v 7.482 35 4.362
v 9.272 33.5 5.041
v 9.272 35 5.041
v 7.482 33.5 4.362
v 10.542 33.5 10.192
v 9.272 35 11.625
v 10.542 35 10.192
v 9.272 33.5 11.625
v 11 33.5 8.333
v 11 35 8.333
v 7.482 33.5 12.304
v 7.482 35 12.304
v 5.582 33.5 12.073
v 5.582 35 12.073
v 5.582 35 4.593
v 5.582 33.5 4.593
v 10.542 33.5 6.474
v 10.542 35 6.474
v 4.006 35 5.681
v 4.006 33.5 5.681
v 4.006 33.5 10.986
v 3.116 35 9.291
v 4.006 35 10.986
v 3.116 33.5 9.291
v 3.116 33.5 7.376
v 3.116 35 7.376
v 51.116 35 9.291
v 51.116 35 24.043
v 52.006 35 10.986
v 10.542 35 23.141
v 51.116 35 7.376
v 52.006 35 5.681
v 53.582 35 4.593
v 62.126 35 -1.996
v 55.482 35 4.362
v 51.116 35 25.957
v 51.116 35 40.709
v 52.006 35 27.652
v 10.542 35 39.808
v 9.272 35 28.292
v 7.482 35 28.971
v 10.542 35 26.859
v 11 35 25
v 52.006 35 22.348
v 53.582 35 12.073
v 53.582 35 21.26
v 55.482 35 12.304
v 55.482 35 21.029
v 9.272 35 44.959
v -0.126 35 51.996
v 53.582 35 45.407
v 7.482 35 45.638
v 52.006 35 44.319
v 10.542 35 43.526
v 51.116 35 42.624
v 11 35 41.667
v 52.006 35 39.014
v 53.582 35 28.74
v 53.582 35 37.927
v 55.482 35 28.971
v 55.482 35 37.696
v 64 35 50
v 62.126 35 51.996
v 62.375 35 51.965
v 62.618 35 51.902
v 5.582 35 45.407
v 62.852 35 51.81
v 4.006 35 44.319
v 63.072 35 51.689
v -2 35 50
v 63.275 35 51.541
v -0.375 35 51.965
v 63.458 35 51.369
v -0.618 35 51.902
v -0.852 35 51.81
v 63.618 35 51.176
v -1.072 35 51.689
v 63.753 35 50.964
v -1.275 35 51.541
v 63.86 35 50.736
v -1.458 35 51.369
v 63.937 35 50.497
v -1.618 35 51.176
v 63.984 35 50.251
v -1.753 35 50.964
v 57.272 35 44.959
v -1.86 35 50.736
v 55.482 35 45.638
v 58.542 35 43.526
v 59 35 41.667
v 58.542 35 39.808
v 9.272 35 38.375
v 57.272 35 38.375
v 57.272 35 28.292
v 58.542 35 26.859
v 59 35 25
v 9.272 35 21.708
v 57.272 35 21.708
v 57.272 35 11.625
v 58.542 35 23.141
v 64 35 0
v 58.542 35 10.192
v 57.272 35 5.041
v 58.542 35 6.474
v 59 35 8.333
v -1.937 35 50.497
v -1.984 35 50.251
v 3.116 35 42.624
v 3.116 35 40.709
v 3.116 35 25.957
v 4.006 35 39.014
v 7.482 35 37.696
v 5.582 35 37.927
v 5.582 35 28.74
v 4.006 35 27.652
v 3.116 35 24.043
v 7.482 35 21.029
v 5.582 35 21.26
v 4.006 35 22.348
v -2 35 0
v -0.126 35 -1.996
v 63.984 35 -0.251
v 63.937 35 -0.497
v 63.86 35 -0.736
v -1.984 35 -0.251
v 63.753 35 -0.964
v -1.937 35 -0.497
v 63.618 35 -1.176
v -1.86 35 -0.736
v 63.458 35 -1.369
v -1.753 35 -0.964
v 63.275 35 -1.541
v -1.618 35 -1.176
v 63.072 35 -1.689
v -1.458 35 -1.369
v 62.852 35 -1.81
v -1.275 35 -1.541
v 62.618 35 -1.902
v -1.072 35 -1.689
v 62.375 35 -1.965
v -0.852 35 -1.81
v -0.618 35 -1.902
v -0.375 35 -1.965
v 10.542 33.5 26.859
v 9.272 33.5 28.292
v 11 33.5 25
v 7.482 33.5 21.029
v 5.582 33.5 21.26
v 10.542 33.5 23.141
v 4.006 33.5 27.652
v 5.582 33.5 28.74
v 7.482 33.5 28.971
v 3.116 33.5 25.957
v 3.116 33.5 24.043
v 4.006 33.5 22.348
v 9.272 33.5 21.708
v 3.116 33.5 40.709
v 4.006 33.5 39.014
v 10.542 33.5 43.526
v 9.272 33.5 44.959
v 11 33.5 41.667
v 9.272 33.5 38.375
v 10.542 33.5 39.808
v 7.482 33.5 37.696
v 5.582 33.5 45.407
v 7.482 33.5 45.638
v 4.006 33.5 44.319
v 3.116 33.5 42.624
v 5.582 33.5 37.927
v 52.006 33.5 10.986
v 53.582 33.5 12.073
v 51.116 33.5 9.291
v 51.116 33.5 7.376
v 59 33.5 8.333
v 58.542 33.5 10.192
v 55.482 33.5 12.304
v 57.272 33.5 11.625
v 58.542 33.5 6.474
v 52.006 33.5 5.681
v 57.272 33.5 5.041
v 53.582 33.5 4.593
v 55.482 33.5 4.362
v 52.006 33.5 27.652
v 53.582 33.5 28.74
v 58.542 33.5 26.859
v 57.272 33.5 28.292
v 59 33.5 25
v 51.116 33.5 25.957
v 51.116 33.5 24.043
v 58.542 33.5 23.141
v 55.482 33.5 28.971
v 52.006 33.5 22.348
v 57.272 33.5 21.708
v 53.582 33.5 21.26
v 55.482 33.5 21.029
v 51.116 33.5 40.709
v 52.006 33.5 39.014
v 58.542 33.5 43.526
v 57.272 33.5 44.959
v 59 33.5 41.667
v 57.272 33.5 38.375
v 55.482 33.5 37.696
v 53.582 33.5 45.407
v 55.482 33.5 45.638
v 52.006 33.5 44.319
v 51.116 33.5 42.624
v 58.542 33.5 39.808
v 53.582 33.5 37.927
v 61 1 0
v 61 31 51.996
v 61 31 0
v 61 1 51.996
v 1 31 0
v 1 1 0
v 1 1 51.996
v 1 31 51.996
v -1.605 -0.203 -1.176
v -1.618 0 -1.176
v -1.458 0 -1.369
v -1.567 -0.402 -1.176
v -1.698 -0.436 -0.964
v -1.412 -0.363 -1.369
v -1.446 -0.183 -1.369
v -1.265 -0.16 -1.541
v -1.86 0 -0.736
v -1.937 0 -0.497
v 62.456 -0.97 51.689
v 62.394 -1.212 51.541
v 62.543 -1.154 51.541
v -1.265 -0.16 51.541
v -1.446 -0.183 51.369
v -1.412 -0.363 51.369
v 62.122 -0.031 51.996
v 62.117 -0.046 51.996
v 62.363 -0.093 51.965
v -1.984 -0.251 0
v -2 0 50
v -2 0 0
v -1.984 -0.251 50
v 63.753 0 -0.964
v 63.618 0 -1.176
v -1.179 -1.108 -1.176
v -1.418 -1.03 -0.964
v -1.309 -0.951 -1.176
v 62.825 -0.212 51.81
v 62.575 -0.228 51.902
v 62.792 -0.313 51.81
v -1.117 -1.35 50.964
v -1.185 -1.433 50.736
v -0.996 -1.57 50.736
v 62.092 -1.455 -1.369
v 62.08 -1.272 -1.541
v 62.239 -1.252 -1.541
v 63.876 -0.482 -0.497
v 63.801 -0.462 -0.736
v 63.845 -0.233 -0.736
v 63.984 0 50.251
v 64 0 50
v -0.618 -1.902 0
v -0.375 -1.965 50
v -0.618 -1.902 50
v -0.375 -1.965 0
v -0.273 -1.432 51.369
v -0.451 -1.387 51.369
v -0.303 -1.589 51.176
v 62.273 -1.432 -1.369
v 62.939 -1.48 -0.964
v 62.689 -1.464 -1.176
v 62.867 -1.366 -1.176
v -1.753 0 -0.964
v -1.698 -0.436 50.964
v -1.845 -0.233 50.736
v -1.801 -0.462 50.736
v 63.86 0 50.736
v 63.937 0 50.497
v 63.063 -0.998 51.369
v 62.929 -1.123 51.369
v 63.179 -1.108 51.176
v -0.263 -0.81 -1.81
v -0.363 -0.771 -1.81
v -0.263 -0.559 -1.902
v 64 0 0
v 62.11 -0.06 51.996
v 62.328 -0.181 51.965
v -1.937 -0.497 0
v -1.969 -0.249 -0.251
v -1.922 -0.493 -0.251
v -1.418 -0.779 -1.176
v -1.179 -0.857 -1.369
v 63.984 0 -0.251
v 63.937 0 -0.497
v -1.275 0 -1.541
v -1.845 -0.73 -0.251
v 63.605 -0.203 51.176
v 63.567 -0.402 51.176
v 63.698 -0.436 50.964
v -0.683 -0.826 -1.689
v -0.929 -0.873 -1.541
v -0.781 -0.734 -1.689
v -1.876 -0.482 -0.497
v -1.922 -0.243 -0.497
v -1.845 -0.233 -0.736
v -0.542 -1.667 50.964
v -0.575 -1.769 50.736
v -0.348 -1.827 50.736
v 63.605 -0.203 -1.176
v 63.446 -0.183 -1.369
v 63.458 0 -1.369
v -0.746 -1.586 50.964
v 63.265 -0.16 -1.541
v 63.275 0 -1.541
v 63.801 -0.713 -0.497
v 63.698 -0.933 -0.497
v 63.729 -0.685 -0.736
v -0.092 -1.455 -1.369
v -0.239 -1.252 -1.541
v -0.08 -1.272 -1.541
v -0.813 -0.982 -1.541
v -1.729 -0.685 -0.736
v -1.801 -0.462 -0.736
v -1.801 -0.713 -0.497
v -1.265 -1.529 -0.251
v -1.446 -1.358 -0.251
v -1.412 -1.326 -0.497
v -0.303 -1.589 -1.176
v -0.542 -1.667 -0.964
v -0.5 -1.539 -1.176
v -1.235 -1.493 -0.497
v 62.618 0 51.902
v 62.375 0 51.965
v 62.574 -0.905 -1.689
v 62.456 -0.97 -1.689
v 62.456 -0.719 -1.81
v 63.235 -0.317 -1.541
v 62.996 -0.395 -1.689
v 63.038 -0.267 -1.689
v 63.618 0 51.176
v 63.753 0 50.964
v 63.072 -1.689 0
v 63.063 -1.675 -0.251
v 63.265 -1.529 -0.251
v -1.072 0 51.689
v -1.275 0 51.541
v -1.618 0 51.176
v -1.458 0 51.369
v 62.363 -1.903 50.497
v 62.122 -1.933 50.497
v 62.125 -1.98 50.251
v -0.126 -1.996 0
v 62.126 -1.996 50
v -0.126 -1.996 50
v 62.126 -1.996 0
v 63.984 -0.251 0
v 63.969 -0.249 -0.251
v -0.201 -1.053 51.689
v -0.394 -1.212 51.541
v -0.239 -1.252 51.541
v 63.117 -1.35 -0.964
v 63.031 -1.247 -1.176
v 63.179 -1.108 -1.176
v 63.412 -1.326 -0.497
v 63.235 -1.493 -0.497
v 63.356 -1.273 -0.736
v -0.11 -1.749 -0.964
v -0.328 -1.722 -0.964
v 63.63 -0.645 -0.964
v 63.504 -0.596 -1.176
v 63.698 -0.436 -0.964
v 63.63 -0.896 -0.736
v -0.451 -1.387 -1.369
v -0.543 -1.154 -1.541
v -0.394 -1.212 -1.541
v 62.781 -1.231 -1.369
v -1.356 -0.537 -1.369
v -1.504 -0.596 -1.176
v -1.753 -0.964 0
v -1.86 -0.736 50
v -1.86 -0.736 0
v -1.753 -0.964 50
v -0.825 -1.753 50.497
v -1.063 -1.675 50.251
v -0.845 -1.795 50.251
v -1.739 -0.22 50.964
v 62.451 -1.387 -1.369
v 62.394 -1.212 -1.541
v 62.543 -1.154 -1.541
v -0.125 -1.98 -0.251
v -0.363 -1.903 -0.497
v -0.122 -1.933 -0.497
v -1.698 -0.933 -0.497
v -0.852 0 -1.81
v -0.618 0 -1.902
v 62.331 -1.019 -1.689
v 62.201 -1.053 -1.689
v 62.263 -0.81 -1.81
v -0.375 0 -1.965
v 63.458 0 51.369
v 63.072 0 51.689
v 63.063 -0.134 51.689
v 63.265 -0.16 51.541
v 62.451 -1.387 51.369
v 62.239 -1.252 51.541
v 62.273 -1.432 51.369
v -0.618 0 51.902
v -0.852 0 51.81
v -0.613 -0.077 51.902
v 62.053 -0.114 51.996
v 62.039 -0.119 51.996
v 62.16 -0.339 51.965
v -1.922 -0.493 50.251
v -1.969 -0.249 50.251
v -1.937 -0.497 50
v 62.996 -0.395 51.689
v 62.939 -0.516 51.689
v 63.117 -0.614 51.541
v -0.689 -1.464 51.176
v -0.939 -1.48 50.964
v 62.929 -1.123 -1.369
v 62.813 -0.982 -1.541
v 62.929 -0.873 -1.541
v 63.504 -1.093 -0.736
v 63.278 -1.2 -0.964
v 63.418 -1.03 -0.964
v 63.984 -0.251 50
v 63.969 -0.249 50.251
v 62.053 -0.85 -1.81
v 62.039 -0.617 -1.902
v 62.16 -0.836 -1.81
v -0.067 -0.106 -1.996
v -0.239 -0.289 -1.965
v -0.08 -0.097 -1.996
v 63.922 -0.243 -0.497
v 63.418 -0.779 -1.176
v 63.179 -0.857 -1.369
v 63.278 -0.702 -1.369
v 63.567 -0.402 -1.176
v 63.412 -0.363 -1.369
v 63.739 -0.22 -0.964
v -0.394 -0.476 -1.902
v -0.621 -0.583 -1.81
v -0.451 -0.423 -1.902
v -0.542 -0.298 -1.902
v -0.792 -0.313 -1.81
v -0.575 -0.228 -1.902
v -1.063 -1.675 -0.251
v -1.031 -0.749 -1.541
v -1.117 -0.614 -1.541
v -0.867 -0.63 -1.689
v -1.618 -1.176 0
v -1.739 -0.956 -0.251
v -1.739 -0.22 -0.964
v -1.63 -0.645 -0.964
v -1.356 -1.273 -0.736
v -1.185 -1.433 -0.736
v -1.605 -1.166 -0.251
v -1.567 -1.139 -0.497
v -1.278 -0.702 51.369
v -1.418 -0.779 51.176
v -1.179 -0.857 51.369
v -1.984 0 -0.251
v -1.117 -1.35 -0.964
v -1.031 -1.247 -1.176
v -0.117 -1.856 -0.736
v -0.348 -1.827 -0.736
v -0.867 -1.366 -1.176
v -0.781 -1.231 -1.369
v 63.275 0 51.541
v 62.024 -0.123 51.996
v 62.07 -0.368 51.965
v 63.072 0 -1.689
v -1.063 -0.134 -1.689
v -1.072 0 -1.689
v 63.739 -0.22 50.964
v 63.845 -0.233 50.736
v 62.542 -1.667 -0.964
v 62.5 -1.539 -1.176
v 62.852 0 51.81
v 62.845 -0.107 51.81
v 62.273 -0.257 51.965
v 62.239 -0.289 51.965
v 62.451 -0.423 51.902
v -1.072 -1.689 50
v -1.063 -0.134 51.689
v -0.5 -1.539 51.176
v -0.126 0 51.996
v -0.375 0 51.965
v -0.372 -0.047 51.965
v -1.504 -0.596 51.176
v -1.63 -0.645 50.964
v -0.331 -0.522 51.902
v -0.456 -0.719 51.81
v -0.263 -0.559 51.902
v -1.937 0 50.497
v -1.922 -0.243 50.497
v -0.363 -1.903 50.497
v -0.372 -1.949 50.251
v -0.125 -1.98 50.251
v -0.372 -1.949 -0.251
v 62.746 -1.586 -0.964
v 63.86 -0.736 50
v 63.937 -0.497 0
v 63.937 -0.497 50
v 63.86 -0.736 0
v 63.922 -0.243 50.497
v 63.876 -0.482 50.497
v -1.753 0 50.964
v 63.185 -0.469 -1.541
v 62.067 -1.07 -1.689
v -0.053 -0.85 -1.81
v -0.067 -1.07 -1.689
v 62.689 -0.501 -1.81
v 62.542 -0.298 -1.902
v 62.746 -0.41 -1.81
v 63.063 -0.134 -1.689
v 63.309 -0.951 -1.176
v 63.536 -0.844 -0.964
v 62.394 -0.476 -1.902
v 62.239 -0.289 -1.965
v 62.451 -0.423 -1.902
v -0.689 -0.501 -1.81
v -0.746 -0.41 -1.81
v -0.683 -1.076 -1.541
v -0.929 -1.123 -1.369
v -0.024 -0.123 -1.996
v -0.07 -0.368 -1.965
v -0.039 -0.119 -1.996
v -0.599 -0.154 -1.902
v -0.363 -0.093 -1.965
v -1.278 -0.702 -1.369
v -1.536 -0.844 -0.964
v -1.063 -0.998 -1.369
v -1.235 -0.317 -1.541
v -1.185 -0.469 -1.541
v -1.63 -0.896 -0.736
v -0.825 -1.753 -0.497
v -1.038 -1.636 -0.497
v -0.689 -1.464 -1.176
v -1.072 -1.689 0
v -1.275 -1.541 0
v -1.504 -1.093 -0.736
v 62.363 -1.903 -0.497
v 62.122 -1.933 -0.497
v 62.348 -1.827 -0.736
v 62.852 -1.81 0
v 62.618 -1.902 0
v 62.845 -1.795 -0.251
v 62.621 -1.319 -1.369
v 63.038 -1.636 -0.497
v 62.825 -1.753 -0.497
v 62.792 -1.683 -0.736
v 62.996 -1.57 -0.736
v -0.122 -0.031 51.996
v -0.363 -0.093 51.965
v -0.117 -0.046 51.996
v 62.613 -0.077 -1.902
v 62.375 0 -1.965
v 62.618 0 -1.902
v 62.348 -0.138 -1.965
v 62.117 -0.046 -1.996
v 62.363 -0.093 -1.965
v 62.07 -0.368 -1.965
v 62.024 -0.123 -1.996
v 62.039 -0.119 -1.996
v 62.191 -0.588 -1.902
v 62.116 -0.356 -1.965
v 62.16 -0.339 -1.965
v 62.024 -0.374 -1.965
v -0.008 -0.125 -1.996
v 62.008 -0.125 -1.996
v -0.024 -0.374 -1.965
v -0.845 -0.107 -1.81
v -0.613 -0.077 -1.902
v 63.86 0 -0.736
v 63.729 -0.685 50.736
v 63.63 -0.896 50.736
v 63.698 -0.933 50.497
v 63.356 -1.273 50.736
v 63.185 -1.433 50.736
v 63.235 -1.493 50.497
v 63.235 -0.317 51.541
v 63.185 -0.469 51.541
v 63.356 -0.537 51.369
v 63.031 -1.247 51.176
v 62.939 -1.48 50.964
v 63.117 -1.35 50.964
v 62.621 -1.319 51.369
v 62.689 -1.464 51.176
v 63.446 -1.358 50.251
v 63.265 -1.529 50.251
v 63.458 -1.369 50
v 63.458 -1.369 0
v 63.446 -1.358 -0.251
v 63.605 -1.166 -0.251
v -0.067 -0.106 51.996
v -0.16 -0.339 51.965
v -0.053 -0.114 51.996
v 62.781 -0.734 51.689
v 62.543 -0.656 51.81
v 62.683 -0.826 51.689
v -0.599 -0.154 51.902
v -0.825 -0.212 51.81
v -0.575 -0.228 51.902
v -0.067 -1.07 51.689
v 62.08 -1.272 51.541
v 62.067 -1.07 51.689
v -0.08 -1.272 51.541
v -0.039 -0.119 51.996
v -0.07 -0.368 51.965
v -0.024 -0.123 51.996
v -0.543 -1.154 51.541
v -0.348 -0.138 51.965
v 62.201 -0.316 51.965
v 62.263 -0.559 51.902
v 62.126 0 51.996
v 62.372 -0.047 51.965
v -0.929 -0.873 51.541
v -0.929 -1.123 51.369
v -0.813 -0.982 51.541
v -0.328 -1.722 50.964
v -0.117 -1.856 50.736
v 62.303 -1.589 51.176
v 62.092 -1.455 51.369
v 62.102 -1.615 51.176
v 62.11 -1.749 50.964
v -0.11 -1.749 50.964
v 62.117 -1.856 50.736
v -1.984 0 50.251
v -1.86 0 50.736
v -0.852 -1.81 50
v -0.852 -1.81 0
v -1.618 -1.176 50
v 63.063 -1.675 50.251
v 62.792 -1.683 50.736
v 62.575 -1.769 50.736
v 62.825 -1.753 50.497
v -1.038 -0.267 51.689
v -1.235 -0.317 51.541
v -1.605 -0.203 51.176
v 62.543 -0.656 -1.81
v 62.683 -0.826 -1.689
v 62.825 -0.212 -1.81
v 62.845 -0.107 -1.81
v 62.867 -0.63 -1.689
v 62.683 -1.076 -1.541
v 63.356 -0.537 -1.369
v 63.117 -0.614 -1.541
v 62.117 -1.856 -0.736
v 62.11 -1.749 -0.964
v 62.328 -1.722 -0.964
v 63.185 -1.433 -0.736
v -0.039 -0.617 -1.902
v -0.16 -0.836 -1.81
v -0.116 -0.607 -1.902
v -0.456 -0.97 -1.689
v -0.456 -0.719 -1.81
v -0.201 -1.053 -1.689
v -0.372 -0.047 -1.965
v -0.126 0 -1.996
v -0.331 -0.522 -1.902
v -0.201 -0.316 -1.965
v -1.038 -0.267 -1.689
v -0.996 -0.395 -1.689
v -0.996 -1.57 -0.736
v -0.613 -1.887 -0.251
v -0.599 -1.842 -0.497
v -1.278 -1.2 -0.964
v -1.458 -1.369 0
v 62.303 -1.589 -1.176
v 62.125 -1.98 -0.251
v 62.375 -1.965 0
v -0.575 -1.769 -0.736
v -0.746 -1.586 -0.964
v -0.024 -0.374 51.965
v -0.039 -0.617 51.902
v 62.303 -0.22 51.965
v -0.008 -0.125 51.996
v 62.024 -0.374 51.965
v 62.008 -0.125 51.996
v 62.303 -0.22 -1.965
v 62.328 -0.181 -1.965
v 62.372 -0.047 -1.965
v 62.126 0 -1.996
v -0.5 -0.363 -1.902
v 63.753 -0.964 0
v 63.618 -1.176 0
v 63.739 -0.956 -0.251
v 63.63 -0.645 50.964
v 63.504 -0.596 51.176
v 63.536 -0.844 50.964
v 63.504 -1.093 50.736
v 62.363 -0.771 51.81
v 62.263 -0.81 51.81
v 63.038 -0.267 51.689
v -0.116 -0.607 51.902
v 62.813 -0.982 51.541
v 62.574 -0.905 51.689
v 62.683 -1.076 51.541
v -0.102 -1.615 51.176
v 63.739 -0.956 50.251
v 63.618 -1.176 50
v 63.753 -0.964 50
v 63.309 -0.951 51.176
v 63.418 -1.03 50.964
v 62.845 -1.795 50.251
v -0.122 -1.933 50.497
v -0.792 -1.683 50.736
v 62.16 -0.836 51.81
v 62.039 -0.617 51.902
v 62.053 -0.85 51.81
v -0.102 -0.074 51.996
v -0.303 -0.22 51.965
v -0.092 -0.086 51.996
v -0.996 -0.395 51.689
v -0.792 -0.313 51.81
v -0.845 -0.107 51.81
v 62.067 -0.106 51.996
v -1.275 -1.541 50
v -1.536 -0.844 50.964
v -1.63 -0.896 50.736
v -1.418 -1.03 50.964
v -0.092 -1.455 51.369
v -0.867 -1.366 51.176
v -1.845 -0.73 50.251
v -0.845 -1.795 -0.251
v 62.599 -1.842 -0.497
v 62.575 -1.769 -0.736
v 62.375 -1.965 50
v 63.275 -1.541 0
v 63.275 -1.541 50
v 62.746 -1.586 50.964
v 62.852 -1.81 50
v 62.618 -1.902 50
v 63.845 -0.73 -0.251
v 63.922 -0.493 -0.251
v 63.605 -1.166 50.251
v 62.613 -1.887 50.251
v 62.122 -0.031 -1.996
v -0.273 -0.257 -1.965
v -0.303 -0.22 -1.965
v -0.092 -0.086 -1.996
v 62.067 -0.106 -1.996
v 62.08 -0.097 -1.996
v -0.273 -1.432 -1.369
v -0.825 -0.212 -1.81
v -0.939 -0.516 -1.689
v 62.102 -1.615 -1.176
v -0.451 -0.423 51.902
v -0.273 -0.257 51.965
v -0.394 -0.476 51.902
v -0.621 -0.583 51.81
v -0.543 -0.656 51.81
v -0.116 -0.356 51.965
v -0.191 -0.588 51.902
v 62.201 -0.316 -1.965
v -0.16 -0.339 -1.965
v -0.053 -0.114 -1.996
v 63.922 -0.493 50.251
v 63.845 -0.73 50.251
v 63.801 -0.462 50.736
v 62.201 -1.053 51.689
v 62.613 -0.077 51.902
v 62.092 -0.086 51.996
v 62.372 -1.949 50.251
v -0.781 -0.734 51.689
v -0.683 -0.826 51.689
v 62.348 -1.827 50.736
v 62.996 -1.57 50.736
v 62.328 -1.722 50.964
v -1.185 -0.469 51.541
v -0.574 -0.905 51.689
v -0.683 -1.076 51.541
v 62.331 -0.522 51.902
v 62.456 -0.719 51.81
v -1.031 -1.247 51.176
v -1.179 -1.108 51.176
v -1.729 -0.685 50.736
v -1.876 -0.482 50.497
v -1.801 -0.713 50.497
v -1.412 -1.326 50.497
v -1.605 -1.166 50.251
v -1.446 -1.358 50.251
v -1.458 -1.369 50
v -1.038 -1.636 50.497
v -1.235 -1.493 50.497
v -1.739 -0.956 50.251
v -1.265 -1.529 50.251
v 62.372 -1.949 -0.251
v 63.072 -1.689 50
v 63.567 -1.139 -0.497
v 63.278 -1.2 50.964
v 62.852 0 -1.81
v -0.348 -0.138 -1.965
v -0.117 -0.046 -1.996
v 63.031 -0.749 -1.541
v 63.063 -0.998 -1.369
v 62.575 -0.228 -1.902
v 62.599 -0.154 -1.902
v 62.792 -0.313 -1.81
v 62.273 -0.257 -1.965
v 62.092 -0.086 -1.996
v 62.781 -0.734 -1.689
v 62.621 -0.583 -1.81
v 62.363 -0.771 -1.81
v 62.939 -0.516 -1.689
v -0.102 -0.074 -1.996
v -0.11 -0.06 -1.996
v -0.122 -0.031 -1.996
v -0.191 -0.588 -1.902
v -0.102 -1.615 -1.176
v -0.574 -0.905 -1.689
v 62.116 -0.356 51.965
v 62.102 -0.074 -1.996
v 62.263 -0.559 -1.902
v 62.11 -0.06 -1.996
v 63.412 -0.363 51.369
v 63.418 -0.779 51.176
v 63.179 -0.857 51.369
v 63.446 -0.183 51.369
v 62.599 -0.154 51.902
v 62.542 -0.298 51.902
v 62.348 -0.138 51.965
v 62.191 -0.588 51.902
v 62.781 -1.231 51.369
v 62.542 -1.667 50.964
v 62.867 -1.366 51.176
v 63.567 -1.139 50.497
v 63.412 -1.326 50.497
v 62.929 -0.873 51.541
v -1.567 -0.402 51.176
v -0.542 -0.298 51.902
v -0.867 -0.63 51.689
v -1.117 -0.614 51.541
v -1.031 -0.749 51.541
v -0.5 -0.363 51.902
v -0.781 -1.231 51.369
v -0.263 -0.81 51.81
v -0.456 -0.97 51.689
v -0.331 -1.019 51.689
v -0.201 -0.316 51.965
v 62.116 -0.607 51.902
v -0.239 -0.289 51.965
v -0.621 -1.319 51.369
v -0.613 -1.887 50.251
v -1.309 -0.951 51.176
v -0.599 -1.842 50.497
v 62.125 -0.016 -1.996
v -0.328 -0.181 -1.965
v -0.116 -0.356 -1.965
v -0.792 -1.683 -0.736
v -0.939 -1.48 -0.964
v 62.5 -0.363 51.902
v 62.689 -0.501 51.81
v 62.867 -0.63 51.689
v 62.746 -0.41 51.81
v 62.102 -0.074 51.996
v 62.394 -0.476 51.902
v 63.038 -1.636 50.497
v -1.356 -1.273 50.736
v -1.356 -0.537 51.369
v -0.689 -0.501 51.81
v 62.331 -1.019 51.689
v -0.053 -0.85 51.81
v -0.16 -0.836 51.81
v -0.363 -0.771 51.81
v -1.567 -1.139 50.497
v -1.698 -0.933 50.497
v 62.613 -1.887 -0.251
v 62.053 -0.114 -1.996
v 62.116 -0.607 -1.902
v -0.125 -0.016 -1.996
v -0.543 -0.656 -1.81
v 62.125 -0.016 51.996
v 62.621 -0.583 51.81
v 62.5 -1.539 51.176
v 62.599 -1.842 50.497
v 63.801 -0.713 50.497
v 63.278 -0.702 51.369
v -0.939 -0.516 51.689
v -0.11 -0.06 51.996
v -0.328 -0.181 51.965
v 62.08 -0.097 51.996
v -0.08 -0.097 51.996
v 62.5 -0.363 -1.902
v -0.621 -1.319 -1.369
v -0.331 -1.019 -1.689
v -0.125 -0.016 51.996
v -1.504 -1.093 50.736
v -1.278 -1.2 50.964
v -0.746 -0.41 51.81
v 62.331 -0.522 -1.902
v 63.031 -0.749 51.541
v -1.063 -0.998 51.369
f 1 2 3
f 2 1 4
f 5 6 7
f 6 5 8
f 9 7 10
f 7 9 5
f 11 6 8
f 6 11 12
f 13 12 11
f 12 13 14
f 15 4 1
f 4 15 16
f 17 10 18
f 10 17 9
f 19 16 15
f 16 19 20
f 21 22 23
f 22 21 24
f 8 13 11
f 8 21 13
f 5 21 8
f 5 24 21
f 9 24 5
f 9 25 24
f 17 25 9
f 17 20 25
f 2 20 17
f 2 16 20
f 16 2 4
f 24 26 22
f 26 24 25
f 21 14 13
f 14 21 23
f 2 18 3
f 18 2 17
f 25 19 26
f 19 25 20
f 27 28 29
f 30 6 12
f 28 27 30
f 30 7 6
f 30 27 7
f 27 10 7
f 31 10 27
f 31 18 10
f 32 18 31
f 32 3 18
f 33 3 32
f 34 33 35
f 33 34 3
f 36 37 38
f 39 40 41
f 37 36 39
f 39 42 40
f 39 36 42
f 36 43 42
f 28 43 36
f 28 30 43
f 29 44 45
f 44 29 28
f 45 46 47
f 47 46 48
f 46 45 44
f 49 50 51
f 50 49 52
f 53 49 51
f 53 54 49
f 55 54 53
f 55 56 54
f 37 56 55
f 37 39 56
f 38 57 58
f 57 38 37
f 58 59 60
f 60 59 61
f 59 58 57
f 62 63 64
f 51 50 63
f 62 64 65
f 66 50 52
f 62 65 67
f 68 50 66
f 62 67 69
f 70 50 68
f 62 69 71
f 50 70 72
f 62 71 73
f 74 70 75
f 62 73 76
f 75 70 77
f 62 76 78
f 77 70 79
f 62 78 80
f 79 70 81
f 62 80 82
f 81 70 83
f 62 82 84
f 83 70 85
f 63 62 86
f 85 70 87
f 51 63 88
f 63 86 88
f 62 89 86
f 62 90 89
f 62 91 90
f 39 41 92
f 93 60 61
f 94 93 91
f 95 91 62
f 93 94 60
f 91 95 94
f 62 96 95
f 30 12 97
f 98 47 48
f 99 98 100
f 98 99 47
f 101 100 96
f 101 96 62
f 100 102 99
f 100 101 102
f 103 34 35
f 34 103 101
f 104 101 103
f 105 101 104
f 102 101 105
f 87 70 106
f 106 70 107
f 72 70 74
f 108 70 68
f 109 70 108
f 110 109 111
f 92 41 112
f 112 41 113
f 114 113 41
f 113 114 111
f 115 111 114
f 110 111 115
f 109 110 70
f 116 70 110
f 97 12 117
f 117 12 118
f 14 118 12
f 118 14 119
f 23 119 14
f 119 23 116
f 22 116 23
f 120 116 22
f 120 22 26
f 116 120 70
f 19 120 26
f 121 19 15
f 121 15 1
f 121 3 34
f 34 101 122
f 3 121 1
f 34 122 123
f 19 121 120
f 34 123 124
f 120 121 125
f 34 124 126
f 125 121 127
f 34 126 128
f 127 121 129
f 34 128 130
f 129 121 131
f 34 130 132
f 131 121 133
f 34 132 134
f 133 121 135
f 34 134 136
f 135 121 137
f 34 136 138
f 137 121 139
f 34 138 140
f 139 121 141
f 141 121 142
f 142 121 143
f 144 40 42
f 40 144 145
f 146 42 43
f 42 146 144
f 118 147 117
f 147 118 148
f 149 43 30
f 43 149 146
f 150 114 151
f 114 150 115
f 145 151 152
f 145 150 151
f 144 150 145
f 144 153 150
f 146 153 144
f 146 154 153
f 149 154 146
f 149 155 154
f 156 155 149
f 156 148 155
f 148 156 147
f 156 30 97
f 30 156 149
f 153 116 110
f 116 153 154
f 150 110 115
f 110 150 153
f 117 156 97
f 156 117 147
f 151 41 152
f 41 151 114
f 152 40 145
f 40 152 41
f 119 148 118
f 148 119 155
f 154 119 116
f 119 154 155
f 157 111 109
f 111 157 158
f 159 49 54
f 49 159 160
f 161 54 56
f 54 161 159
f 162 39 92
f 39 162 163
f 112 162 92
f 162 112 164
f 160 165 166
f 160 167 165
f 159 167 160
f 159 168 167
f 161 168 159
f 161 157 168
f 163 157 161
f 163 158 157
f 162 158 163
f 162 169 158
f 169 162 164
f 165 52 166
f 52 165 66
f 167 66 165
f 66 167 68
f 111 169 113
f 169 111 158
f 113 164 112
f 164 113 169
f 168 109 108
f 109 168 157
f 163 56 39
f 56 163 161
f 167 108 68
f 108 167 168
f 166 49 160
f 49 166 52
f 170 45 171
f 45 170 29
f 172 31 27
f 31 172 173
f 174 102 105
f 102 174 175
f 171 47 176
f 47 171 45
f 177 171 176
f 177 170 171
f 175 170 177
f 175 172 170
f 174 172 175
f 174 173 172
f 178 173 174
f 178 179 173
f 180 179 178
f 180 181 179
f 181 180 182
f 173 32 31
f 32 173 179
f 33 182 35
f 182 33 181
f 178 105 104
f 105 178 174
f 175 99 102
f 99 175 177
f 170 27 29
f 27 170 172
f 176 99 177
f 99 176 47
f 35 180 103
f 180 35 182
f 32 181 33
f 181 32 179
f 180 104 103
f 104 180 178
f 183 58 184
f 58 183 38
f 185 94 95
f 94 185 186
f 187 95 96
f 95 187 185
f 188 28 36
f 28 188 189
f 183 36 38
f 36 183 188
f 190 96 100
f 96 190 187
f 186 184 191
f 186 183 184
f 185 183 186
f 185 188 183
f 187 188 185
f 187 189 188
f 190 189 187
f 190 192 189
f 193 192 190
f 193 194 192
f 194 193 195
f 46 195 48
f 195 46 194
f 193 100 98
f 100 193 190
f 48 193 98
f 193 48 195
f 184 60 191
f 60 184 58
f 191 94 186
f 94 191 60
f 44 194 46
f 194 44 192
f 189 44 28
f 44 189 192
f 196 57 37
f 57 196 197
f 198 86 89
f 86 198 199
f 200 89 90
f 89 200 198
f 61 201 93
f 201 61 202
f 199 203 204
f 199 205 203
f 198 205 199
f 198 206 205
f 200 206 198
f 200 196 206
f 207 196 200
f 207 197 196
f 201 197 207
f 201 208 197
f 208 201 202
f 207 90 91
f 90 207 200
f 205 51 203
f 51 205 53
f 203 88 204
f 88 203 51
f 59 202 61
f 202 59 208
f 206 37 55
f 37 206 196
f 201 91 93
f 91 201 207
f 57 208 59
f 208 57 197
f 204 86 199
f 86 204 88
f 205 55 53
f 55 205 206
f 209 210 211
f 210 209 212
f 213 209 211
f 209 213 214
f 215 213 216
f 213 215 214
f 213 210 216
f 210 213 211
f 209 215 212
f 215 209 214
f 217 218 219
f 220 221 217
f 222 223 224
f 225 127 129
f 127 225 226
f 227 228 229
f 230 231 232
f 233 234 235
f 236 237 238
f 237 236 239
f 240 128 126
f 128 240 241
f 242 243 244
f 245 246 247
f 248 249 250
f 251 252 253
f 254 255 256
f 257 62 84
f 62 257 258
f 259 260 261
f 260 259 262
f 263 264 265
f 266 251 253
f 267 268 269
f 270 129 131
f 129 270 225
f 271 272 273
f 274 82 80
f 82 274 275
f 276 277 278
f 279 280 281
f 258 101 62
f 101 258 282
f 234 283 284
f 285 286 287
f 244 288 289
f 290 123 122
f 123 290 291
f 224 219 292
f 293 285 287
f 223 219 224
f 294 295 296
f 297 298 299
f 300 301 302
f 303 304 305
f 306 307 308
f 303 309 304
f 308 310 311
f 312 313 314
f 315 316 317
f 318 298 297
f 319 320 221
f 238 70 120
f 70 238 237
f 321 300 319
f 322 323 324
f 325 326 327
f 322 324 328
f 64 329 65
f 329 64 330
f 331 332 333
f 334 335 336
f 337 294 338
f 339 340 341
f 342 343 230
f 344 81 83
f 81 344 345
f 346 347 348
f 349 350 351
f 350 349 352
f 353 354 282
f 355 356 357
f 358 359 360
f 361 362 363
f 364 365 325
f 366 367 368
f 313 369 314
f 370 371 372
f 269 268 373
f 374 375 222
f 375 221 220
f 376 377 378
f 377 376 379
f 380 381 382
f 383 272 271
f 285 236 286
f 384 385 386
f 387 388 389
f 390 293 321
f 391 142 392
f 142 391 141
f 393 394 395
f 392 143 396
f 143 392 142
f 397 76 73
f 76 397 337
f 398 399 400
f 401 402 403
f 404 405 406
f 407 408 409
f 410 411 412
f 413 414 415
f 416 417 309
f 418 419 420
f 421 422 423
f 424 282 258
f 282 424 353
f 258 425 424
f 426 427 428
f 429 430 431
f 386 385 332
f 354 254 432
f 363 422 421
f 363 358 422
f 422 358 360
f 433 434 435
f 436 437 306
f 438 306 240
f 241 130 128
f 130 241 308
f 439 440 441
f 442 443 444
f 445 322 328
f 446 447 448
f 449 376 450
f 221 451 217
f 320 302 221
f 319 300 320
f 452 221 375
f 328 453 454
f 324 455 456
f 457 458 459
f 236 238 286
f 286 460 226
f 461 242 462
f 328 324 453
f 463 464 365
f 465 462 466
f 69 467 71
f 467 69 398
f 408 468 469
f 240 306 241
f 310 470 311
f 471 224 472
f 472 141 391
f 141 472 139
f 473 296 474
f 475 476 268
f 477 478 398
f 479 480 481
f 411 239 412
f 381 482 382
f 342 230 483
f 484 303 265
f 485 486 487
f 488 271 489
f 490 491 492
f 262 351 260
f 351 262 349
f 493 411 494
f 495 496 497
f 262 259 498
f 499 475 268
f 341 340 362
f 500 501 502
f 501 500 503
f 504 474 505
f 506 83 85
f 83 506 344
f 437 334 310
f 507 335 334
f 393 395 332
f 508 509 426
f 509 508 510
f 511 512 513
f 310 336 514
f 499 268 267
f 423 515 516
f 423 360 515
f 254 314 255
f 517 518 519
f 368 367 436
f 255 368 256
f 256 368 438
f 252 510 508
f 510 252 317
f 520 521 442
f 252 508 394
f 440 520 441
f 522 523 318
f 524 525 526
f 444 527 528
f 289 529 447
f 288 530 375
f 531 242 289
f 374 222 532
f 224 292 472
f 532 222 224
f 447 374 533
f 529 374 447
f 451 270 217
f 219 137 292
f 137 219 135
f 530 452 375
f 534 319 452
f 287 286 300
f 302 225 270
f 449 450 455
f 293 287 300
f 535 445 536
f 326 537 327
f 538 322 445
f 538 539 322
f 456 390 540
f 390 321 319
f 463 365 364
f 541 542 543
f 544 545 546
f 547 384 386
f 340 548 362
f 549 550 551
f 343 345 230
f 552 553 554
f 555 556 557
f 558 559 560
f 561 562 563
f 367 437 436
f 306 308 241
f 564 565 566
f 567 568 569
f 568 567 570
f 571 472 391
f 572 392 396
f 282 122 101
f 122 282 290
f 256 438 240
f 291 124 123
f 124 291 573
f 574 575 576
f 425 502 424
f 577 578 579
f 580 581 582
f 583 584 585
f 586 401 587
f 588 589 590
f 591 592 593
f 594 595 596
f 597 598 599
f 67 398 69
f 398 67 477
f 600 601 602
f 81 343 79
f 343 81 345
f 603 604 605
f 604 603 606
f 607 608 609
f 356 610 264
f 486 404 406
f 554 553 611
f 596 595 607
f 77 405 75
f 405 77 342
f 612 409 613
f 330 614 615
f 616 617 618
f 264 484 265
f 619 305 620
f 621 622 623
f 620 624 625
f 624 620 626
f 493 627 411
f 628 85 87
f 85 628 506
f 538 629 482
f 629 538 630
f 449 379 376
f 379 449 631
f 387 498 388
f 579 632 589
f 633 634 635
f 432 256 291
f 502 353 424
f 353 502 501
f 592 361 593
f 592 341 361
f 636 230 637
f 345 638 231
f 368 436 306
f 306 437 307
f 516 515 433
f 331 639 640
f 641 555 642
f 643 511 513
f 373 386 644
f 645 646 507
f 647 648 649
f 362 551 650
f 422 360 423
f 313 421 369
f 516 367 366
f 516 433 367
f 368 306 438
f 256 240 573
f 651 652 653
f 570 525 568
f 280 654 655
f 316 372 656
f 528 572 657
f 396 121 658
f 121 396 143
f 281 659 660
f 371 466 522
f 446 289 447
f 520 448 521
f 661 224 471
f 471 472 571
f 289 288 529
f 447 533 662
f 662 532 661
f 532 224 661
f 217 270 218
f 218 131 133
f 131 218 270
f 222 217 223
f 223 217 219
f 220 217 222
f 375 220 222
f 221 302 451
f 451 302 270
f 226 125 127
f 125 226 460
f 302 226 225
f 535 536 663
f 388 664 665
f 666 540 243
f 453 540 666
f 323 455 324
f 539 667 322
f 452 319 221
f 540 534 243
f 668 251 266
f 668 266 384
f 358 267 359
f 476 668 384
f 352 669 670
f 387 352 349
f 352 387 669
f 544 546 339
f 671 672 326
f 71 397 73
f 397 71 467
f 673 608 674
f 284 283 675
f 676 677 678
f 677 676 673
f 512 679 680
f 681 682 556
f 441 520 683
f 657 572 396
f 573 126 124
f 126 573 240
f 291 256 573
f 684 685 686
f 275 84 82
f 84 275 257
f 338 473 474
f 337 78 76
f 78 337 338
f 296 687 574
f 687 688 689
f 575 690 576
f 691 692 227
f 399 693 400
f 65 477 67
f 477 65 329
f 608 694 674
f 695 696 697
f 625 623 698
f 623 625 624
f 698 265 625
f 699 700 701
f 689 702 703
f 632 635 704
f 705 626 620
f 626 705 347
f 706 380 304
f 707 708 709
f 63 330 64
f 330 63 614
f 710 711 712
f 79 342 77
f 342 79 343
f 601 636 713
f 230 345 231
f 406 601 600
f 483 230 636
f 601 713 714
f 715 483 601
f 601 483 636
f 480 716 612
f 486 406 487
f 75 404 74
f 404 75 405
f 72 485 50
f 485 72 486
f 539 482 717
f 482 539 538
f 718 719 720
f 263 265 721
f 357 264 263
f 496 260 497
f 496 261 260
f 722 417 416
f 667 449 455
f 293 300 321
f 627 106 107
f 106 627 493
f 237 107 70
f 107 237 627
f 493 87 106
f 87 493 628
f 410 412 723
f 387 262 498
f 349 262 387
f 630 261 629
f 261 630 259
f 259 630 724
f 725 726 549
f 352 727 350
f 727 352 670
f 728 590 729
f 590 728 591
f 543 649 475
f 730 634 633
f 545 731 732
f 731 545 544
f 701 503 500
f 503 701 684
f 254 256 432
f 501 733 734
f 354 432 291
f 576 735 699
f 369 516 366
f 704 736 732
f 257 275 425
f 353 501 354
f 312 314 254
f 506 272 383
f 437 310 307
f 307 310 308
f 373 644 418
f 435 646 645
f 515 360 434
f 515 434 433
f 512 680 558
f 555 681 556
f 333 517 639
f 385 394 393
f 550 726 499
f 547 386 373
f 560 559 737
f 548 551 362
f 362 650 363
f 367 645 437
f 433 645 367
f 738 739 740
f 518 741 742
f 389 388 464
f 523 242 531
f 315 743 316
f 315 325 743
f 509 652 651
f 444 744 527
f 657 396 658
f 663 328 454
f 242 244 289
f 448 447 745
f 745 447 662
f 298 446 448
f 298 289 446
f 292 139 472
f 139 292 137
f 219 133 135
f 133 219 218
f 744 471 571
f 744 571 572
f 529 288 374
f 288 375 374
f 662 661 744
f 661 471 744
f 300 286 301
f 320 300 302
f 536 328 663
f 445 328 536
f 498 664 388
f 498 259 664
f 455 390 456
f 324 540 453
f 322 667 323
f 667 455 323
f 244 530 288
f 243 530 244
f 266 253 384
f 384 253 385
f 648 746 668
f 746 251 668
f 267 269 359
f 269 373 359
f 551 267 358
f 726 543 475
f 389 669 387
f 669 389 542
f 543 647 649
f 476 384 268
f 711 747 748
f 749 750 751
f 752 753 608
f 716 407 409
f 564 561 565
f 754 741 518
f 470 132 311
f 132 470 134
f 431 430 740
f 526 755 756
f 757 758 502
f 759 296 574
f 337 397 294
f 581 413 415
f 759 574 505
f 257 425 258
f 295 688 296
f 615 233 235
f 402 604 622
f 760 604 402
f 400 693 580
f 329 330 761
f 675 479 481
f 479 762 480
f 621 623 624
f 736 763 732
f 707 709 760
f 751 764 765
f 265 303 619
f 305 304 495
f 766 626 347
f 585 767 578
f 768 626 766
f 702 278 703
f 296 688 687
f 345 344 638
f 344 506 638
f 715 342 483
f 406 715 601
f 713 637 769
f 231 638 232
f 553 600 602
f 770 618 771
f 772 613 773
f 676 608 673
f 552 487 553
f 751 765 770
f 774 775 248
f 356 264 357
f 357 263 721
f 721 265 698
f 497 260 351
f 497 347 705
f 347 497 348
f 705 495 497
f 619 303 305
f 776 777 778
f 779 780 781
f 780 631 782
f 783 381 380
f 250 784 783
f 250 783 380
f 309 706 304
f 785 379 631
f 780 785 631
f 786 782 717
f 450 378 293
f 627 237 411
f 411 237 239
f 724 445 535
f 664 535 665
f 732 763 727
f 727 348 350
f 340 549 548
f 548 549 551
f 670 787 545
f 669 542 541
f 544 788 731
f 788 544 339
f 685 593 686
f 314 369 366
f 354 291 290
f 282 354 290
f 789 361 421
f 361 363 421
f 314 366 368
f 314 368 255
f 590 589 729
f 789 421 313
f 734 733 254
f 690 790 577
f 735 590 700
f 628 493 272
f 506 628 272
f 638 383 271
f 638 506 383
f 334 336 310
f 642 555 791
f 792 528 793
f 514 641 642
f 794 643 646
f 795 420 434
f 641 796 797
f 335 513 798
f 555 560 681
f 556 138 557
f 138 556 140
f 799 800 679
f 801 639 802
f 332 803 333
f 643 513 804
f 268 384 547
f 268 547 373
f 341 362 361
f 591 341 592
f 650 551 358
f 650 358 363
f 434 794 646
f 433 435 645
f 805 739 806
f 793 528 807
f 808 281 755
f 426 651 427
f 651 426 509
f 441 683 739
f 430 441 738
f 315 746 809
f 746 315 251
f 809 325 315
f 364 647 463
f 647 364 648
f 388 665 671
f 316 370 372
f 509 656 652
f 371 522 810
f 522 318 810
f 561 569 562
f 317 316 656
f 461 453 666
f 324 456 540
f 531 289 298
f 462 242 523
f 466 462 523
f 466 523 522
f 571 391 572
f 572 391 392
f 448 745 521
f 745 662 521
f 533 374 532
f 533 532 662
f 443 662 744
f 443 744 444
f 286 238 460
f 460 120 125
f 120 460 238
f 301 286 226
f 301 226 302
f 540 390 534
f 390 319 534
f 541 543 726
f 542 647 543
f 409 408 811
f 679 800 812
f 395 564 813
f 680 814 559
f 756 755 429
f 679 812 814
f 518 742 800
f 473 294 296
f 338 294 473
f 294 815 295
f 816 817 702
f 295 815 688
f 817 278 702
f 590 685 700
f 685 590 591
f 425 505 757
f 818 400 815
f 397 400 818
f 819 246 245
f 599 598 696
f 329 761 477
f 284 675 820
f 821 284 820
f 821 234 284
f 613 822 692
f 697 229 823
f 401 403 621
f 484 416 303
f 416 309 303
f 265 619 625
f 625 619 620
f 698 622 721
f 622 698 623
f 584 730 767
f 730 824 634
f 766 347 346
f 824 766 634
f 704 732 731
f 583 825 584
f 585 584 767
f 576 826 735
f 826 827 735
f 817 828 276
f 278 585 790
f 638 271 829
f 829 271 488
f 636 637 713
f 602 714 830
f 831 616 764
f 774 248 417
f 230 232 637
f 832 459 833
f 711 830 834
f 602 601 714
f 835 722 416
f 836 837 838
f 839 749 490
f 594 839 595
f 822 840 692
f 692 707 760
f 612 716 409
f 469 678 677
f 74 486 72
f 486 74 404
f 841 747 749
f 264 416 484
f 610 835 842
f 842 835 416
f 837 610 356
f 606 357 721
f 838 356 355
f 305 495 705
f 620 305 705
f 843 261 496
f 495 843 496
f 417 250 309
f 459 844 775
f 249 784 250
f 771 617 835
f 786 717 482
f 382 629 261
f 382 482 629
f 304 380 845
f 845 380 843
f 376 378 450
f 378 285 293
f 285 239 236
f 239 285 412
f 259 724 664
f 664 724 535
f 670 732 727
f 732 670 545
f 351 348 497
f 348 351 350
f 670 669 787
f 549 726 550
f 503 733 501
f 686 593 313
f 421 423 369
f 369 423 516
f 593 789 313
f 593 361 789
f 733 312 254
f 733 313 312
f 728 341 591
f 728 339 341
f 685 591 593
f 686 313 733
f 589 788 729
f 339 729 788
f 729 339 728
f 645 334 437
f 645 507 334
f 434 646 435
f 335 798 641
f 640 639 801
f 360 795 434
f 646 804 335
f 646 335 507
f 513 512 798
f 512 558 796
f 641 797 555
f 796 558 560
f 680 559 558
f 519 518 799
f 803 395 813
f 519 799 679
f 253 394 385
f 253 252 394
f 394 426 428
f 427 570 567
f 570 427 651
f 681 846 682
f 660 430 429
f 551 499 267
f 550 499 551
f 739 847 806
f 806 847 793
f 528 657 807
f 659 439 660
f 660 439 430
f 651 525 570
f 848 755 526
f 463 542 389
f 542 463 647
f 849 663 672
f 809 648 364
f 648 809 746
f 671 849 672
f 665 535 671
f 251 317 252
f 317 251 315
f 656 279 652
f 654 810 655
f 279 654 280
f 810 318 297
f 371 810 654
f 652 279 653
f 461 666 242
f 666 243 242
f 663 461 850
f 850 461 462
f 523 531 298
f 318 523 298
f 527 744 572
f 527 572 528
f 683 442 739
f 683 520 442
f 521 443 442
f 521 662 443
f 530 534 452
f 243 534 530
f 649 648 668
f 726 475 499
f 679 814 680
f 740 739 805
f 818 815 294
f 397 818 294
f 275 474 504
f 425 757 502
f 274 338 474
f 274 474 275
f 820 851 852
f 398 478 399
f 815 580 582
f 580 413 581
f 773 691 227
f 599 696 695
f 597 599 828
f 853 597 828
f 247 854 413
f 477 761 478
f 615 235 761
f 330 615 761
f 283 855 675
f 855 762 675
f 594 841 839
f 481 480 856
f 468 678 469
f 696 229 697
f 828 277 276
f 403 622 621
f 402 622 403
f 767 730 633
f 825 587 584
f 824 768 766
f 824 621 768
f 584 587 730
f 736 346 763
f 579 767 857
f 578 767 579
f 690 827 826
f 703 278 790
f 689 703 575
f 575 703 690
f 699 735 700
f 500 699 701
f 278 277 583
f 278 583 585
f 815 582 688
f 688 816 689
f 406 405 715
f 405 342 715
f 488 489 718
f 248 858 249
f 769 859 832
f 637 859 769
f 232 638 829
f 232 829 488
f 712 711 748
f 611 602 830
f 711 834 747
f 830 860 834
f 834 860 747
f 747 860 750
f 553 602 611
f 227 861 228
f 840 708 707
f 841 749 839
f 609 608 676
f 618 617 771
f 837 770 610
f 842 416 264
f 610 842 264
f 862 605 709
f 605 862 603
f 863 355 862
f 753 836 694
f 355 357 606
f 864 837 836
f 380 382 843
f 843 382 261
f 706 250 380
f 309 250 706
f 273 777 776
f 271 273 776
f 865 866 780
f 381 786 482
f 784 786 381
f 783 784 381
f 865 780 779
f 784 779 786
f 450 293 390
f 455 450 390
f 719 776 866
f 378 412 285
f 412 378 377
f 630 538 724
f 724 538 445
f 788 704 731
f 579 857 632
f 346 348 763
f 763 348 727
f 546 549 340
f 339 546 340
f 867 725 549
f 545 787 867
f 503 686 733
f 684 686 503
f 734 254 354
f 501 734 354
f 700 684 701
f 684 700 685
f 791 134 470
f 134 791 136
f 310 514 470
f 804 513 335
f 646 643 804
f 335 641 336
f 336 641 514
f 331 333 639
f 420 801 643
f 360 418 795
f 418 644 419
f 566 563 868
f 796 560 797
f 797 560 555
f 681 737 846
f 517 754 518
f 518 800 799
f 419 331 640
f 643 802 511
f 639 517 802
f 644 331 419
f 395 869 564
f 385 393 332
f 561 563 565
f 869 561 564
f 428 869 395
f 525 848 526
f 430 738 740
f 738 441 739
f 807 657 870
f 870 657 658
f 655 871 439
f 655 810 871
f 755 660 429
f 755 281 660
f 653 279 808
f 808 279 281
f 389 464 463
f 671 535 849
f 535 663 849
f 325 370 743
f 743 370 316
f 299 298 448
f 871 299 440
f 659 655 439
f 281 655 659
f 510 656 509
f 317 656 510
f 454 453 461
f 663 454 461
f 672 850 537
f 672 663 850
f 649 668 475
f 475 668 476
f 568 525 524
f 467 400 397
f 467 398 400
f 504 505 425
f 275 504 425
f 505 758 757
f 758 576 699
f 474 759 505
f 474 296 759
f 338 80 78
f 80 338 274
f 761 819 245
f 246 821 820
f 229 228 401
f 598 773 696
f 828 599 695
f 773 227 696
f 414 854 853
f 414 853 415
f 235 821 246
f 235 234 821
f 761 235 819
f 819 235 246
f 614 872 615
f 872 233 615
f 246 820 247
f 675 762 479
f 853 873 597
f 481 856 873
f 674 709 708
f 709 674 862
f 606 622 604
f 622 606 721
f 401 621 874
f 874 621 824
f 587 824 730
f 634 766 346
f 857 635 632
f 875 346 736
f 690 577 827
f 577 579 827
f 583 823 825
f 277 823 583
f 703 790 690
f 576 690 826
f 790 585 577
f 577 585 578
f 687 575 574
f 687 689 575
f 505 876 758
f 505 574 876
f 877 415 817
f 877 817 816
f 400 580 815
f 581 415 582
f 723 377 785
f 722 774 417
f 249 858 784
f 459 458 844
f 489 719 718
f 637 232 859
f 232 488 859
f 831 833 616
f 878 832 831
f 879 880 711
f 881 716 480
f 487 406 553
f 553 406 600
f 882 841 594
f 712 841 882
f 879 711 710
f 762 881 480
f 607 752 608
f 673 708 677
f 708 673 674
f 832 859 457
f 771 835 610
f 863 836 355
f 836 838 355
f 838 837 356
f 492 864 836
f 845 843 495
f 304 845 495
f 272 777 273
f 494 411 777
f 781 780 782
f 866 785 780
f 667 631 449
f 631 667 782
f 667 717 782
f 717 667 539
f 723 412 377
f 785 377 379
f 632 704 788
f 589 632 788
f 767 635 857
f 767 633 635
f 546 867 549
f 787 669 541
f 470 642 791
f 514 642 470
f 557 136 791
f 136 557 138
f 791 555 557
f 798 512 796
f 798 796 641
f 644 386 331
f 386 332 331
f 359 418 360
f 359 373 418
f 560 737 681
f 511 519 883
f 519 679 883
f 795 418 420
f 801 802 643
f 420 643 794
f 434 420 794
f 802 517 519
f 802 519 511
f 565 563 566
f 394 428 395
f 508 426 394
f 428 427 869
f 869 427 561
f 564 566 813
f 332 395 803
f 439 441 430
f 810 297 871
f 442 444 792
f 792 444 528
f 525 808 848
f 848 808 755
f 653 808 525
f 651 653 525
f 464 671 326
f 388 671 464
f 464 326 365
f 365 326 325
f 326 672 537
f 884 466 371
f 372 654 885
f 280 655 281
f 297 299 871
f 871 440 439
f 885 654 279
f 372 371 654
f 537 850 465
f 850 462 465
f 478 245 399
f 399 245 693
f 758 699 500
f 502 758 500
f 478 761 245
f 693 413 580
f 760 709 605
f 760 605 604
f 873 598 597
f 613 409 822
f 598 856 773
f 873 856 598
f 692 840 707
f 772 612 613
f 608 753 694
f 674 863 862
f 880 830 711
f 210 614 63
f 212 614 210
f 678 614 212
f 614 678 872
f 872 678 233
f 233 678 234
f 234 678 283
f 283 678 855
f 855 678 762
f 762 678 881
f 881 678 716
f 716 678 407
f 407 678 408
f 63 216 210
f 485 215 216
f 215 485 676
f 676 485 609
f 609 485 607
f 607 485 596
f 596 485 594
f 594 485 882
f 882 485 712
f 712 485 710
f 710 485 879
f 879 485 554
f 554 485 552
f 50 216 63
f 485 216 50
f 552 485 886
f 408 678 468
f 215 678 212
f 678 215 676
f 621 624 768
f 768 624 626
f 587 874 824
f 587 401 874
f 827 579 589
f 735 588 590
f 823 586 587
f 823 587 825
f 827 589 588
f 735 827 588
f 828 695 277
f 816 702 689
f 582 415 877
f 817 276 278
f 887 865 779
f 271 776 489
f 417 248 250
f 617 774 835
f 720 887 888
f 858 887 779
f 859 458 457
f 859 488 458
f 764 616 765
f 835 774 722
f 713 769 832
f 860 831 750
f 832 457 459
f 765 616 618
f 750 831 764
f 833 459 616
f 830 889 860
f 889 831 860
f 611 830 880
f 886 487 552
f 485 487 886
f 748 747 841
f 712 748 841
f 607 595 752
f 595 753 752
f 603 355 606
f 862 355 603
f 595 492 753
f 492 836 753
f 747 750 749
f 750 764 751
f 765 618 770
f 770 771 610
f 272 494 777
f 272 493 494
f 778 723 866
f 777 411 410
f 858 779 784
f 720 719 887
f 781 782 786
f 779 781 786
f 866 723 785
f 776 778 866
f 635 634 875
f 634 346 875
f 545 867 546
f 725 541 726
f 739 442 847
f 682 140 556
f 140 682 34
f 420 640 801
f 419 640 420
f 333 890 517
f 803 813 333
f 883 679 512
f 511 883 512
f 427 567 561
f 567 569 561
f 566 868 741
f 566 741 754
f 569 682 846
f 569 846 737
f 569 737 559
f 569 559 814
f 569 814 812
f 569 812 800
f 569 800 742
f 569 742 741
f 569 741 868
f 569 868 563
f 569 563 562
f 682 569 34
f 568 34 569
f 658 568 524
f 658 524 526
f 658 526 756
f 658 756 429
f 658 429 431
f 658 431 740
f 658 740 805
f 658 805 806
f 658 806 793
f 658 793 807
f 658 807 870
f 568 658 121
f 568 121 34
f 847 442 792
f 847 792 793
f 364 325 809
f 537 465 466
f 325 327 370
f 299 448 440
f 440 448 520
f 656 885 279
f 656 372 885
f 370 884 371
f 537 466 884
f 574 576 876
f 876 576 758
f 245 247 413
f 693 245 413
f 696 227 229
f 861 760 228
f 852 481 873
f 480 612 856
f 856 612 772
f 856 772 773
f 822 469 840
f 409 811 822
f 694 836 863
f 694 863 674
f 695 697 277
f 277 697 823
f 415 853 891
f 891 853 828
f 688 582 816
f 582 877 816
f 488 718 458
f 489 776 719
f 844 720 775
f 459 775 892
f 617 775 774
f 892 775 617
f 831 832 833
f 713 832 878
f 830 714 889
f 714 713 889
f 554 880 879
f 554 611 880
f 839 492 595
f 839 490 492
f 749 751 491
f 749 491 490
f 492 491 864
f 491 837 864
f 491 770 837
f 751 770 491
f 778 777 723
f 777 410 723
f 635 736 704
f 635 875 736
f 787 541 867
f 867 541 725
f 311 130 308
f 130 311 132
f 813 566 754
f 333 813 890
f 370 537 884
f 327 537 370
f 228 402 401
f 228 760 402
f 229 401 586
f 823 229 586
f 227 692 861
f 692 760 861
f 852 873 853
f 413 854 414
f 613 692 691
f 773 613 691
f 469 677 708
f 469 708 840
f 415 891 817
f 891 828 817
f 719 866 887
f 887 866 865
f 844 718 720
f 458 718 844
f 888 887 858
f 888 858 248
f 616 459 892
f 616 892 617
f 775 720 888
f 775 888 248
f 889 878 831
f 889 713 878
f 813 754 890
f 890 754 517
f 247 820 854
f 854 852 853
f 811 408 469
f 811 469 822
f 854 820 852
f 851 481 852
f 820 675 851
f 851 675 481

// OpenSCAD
magnet_depth = 1.5;
magnet_radius = 4;
height = 50;
difference(){
    minkowski(){
      cube([62, 35, height]);
      sphere(r=2,$fn=50);
    }
    union(){
        translate([1, 1, 0])
        cube([60, 30, height+20]);
          
        translate([-2, 35, -2])
        cube([70,30,height+20]);

        translate([31, 35, height/2])   
        rotate([90, 0, 0])
        union(){
            translate([-24, -(height/3), 0])
            cylinder(magnet_depth, r=magnet_radius);
            translate([-24, 0, 0])
            cylinder(magnet_depth, r=magnet_radius);
            translate([-24, (height/3), 0])
            cylinder(magnet_depth, r=magnet_radius);
            translate([24, -(height/3), 0])
            cylinder(magnet_depth, r=magnet_radius);
            translate([24, 0, 0])
            cylinder(magnet_depth, r=magnet_radius);
            translate([24, (height/3), 0])
            cylinder(magnet_depth, r=magnet_radius);  
        }
    }
}
  
  
  
